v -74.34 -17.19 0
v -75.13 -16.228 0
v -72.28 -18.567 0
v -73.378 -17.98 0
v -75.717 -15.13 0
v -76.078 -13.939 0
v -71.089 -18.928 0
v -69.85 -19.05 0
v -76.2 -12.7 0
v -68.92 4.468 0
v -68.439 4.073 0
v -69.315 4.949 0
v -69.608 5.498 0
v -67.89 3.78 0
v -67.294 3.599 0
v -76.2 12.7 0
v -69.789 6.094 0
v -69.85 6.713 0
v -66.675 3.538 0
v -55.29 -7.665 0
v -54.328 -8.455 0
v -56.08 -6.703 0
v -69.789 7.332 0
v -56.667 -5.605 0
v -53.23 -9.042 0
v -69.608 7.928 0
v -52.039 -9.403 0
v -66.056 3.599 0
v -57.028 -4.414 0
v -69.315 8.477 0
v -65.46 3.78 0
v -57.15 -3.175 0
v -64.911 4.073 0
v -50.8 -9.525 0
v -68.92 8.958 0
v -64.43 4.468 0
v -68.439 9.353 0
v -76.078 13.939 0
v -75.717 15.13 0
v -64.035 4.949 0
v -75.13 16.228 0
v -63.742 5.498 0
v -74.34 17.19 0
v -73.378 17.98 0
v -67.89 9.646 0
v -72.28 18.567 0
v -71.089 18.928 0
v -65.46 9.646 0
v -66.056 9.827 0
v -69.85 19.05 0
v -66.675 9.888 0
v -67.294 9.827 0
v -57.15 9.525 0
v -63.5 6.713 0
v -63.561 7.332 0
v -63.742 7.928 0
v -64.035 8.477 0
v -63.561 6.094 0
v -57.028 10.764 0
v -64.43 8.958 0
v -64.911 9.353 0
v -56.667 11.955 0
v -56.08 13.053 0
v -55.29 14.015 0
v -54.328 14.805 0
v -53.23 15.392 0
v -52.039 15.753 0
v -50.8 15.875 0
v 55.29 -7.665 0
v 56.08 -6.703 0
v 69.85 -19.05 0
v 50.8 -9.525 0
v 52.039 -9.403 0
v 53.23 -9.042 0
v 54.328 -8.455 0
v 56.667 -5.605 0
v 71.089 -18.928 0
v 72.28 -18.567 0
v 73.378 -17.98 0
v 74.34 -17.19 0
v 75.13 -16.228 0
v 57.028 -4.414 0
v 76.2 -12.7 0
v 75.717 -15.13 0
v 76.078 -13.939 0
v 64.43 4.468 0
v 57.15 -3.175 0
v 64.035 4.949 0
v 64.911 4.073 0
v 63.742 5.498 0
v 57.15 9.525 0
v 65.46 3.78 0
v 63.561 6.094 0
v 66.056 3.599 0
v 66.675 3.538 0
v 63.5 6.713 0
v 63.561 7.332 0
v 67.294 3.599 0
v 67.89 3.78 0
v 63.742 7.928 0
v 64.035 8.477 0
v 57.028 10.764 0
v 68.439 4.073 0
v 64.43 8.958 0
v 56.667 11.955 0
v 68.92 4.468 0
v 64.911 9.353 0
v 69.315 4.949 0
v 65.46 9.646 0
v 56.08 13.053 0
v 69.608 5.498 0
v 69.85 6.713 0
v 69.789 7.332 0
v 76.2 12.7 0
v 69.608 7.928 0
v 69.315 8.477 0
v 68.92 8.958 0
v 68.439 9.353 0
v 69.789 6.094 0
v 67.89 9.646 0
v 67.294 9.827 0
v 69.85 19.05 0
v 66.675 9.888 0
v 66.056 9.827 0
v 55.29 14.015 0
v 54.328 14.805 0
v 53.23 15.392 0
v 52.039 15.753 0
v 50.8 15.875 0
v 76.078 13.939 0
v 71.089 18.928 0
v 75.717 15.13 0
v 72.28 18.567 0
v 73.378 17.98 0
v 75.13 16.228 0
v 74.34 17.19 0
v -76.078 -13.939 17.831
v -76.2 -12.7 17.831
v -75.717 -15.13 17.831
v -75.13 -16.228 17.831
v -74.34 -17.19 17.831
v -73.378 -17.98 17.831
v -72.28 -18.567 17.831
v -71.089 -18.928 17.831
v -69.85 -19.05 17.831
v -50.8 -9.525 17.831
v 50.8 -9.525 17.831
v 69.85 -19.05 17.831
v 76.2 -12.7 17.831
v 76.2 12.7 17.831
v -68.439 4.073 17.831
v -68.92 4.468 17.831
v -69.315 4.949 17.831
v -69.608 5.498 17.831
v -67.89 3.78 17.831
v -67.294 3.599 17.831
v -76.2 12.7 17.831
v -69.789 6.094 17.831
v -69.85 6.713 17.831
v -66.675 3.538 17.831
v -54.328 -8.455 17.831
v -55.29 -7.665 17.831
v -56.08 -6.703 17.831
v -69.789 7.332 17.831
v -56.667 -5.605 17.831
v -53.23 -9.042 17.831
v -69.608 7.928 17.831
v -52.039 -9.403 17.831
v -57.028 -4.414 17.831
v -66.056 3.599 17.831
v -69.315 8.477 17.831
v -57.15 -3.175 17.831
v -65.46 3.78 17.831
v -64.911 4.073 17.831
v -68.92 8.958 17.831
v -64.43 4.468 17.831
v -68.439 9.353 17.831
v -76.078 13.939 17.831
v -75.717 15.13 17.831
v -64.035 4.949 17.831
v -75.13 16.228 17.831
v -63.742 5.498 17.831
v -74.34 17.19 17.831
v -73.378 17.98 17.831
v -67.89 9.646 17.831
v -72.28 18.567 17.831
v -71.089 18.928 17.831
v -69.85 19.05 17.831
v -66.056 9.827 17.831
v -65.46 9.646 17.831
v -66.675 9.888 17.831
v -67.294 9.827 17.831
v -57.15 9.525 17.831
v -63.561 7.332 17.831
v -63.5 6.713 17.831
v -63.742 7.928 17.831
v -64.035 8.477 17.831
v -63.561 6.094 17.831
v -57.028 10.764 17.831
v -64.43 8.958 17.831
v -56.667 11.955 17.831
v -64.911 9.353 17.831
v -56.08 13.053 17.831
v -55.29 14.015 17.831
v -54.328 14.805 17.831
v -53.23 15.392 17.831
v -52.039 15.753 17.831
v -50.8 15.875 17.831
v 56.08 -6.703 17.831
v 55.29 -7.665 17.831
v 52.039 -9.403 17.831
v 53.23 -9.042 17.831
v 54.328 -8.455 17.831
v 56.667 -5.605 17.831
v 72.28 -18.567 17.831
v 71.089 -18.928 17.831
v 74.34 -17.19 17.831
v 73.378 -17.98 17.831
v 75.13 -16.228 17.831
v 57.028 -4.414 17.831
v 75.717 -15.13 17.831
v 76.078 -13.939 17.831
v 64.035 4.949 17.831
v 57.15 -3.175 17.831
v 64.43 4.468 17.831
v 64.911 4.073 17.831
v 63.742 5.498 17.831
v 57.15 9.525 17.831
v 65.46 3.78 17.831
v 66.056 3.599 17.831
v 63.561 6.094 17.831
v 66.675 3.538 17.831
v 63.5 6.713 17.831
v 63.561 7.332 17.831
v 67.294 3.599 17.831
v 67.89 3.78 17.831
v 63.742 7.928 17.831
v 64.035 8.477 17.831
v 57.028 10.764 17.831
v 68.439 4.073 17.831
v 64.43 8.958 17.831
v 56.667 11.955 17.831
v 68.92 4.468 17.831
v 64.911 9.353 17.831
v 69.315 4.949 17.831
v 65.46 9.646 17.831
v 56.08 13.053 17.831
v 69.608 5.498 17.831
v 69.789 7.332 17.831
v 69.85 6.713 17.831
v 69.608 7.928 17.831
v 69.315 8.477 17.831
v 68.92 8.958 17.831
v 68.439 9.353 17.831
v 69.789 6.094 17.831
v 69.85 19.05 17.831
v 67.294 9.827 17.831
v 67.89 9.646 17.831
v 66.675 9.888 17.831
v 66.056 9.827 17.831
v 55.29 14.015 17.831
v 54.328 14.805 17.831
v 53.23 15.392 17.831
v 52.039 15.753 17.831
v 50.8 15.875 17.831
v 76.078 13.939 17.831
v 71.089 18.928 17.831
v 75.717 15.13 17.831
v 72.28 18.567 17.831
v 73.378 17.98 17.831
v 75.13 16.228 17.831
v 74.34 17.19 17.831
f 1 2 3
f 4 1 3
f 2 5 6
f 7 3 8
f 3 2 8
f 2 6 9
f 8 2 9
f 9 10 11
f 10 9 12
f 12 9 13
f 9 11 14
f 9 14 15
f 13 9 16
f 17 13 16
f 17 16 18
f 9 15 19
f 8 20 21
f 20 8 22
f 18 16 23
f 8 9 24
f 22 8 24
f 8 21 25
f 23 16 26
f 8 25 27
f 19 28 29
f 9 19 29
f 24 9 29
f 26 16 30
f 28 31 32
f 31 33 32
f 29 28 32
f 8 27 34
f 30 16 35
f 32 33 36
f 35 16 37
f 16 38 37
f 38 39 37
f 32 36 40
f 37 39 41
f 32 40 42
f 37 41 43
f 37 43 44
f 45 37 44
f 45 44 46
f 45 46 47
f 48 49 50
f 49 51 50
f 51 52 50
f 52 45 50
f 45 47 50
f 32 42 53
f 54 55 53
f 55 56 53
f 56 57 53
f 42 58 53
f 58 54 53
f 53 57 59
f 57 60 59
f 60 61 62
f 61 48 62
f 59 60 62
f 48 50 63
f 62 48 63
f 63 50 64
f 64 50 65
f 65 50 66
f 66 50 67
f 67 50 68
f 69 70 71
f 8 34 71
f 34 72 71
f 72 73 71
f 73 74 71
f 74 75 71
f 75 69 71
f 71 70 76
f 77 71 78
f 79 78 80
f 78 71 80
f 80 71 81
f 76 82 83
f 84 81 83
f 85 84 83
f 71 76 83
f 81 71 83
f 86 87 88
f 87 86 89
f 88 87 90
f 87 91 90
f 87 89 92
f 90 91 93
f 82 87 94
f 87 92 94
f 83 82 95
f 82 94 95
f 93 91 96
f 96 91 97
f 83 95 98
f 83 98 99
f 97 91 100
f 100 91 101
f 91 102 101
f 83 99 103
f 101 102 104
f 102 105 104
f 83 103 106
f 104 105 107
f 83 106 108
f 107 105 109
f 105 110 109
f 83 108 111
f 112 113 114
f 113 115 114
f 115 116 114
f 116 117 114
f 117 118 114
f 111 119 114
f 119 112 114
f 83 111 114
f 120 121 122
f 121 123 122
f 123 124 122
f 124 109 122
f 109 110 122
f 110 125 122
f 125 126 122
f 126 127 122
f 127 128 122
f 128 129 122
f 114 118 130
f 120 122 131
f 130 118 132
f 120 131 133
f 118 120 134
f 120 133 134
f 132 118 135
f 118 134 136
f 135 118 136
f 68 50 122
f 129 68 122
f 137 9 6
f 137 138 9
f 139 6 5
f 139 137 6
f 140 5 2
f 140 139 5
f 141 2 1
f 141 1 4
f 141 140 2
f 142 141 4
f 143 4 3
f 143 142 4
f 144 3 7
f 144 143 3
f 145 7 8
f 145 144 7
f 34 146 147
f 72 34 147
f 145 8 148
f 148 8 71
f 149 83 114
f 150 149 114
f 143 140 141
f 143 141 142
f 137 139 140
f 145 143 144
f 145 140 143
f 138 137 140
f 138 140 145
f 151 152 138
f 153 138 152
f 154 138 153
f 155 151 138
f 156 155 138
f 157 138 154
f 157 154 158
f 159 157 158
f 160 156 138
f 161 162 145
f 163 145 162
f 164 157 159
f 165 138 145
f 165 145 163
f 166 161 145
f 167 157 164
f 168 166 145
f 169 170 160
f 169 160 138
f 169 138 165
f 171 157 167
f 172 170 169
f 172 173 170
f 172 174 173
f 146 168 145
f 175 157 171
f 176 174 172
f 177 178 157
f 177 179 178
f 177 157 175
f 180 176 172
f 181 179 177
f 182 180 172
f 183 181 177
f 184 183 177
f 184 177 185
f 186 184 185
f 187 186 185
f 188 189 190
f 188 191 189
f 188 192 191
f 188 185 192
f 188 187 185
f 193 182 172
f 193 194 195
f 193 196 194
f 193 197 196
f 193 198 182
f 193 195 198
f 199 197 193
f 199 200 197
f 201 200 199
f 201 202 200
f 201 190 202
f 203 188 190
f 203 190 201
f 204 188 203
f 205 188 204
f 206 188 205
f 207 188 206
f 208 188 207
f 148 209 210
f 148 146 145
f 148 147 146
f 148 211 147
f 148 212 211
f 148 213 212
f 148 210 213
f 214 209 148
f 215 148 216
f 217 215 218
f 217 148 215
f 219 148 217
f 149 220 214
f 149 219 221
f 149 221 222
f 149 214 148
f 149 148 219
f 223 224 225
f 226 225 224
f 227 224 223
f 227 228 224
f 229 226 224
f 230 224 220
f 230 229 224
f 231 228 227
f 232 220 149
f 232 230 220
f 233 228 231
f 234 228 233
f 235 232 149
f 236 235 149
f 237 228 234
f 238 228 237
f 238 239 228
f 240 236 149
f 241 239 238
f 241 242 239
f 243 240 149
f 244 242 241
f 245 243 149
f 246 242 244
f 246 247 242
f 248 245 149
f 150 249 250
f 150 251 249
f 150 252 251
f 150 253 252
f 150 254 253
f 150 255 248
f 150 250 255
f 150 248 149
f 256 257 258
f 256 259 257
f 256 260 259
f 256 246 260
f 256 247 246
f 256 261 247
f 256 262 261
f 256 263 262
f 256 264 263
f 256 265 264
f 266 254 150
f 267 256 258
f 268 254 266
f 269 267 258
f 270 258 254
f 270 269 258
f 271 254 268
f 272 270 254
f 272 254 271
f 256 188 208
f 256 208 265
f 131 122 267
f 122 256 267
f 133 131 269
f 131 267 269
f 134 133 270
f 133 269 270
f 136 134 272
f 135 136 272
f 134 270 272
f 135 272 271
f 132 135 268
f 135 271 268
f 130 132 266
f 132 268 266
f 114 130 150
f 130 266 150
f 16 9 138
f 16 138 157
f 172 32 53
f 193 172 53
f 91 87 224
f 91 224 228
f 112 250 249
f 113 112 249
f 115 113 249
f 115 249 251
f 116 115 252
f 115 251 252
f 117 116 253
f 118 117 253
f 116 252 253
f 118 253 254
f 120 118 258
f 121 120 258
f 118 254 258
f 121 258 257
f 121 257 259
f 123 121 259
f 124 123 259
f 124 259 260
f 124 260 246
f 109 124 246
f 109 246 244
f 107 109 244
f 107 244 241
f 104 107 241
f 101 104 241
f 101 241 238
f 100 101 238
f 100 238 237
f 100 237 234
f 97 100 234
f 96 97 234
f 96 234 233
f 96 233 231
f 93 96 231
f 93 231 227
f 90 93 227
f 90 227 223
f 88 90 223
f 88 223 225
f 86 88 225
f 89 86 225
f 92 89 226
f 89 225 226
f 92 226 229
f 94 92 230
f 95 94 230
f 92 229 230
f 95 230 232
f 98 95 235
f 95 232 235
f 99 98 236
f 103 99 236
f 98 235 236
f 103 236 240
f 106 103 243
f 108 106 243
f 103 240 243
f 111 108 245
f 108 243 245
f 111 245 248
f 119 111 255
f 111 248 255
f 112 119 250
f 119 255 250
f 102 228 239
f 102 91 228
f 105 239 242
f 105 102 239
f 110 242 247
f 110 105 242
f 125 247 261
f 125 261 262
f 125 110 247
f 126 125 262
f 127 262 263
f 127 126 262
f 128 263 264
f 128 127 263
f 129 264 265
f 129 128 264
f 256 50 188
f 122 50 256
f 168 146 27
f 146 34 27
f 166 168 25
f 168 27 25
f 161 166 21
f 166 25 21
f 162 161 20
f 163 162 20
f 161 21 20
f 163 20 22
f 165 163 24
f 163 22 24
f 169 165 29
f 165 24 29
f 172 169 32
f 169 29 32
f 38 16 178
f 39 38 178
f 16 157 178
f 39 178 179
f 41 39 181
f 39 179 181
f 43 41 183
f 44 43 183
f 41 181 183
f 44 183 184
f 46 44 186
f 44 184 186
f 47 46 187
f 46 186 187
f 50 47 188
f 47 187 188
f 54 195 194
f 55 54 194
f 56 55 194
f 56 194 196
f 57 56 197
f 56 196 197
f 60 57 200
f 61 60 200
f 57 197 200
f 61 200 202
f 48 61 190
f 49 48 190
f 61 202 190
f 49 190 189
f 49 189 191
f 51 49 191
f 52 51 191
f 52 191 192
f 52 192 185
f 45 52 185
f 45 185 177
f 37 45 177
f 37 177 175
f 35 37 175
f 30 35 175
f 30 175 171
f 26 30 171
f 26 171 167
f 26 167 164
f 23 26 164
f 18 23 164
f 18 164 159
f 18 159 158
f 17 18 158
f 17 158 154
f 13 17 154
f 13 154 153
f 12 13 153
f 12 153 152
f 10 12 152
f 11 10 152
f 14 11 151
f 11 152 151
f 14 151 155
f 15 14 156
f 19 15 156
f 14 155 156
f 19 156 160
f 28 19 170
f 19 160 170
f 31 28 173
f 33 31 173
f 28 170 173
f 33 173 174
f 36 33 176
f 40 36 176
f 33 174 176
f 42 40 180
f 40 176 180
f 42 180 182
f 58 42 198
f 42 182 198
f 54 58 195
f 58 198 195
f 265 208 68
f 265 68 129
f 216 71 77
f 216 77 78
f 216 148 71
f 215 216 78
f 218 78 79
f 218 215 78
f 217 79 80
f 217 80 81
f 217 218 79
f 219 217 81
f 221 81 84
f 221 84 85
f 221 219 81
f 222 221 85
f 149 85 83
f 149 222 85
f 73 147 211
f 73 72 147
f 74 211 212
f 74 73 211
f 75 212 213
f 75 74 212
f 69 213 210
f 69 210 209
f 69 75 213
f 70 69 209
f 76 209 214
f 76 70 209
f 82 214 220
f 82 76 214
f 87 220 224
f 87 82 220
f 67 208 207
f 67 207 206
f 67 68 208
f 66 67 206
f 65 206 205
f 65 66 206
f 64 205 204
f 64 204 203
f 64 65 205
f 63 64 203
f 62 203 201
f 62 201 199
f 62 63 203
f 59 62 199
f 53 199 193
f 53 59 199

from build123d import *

# Parameters (mm, degrees)
SKETCH1_W           = 152.4
SKETCH1_H           = 38.1
BOSS_EXTRUDE1_DEPTH = 17.8308
SKETCH2_W           = 114.3
SKETCH2_H           = 25.4
CUT_EXTRUDE1_DEPTH  = 81.543652317
FILLET1_R           = 6.35
SKETCH3_R           = 3.175
CUT_EXTRUDE2_DEPTH  = 81.543652317


with BuildPart() as part:
    # Sketch1 → Boss-Extrude1 (new body)
    with BuildSketch(Plane.XY):
        Rectangle(SKETCH1_W, SKETCH1_H)
    extrude(amount=BOSS_EXTRUDE1_DEPTH)

    # Sketch2 → Cut-Extrude1 (cut, through all)
    with BuildSketch(Plane.XY.offset(17.8308)):
        with Locations((0, 3.175)):
            Rectangle(SKETCH2_W, SKETCH2_H)
    extrude(amount=-CUT_EXTRUDE1_DEPTH, mode=Mode.SUBTRACT)

    # Fillet1
    fillet1_edges = [part.edges().sort_by_distance(p)[0] for p in [
        (-57.15, -9.525, 8.9154),
        (-57.15, 15.875, 8.9154),
        (57.15, 15.875, 8.9154),
        (57.15, -9.525, 8.9154),
        (-76.2, 19.05, 8.9154),
        (76.2, 19.05, 8.9154),
        (76.2, -19.05, 8.9154),
        (-76.2, -19.05, 8.9154),
    ]]
    fillet(fillet1_edges, radius=FILLET1_R)

    # Sketch3 → Cut-Extrude2 (cut, through all)
    with BuildSketch(Plane.XY.offset(17.8308)):
        with Locations((-66.675, 6.71302)):
            Circle(SKETCH3_R)
        with Locations((66.675, 6.71302)):
            Circle(SKETCH3_R)
    extrude(amount=-CUT_EXTRUDE2_DEPTH, mode=Mode.SUBTRACT)


solid = part.part
